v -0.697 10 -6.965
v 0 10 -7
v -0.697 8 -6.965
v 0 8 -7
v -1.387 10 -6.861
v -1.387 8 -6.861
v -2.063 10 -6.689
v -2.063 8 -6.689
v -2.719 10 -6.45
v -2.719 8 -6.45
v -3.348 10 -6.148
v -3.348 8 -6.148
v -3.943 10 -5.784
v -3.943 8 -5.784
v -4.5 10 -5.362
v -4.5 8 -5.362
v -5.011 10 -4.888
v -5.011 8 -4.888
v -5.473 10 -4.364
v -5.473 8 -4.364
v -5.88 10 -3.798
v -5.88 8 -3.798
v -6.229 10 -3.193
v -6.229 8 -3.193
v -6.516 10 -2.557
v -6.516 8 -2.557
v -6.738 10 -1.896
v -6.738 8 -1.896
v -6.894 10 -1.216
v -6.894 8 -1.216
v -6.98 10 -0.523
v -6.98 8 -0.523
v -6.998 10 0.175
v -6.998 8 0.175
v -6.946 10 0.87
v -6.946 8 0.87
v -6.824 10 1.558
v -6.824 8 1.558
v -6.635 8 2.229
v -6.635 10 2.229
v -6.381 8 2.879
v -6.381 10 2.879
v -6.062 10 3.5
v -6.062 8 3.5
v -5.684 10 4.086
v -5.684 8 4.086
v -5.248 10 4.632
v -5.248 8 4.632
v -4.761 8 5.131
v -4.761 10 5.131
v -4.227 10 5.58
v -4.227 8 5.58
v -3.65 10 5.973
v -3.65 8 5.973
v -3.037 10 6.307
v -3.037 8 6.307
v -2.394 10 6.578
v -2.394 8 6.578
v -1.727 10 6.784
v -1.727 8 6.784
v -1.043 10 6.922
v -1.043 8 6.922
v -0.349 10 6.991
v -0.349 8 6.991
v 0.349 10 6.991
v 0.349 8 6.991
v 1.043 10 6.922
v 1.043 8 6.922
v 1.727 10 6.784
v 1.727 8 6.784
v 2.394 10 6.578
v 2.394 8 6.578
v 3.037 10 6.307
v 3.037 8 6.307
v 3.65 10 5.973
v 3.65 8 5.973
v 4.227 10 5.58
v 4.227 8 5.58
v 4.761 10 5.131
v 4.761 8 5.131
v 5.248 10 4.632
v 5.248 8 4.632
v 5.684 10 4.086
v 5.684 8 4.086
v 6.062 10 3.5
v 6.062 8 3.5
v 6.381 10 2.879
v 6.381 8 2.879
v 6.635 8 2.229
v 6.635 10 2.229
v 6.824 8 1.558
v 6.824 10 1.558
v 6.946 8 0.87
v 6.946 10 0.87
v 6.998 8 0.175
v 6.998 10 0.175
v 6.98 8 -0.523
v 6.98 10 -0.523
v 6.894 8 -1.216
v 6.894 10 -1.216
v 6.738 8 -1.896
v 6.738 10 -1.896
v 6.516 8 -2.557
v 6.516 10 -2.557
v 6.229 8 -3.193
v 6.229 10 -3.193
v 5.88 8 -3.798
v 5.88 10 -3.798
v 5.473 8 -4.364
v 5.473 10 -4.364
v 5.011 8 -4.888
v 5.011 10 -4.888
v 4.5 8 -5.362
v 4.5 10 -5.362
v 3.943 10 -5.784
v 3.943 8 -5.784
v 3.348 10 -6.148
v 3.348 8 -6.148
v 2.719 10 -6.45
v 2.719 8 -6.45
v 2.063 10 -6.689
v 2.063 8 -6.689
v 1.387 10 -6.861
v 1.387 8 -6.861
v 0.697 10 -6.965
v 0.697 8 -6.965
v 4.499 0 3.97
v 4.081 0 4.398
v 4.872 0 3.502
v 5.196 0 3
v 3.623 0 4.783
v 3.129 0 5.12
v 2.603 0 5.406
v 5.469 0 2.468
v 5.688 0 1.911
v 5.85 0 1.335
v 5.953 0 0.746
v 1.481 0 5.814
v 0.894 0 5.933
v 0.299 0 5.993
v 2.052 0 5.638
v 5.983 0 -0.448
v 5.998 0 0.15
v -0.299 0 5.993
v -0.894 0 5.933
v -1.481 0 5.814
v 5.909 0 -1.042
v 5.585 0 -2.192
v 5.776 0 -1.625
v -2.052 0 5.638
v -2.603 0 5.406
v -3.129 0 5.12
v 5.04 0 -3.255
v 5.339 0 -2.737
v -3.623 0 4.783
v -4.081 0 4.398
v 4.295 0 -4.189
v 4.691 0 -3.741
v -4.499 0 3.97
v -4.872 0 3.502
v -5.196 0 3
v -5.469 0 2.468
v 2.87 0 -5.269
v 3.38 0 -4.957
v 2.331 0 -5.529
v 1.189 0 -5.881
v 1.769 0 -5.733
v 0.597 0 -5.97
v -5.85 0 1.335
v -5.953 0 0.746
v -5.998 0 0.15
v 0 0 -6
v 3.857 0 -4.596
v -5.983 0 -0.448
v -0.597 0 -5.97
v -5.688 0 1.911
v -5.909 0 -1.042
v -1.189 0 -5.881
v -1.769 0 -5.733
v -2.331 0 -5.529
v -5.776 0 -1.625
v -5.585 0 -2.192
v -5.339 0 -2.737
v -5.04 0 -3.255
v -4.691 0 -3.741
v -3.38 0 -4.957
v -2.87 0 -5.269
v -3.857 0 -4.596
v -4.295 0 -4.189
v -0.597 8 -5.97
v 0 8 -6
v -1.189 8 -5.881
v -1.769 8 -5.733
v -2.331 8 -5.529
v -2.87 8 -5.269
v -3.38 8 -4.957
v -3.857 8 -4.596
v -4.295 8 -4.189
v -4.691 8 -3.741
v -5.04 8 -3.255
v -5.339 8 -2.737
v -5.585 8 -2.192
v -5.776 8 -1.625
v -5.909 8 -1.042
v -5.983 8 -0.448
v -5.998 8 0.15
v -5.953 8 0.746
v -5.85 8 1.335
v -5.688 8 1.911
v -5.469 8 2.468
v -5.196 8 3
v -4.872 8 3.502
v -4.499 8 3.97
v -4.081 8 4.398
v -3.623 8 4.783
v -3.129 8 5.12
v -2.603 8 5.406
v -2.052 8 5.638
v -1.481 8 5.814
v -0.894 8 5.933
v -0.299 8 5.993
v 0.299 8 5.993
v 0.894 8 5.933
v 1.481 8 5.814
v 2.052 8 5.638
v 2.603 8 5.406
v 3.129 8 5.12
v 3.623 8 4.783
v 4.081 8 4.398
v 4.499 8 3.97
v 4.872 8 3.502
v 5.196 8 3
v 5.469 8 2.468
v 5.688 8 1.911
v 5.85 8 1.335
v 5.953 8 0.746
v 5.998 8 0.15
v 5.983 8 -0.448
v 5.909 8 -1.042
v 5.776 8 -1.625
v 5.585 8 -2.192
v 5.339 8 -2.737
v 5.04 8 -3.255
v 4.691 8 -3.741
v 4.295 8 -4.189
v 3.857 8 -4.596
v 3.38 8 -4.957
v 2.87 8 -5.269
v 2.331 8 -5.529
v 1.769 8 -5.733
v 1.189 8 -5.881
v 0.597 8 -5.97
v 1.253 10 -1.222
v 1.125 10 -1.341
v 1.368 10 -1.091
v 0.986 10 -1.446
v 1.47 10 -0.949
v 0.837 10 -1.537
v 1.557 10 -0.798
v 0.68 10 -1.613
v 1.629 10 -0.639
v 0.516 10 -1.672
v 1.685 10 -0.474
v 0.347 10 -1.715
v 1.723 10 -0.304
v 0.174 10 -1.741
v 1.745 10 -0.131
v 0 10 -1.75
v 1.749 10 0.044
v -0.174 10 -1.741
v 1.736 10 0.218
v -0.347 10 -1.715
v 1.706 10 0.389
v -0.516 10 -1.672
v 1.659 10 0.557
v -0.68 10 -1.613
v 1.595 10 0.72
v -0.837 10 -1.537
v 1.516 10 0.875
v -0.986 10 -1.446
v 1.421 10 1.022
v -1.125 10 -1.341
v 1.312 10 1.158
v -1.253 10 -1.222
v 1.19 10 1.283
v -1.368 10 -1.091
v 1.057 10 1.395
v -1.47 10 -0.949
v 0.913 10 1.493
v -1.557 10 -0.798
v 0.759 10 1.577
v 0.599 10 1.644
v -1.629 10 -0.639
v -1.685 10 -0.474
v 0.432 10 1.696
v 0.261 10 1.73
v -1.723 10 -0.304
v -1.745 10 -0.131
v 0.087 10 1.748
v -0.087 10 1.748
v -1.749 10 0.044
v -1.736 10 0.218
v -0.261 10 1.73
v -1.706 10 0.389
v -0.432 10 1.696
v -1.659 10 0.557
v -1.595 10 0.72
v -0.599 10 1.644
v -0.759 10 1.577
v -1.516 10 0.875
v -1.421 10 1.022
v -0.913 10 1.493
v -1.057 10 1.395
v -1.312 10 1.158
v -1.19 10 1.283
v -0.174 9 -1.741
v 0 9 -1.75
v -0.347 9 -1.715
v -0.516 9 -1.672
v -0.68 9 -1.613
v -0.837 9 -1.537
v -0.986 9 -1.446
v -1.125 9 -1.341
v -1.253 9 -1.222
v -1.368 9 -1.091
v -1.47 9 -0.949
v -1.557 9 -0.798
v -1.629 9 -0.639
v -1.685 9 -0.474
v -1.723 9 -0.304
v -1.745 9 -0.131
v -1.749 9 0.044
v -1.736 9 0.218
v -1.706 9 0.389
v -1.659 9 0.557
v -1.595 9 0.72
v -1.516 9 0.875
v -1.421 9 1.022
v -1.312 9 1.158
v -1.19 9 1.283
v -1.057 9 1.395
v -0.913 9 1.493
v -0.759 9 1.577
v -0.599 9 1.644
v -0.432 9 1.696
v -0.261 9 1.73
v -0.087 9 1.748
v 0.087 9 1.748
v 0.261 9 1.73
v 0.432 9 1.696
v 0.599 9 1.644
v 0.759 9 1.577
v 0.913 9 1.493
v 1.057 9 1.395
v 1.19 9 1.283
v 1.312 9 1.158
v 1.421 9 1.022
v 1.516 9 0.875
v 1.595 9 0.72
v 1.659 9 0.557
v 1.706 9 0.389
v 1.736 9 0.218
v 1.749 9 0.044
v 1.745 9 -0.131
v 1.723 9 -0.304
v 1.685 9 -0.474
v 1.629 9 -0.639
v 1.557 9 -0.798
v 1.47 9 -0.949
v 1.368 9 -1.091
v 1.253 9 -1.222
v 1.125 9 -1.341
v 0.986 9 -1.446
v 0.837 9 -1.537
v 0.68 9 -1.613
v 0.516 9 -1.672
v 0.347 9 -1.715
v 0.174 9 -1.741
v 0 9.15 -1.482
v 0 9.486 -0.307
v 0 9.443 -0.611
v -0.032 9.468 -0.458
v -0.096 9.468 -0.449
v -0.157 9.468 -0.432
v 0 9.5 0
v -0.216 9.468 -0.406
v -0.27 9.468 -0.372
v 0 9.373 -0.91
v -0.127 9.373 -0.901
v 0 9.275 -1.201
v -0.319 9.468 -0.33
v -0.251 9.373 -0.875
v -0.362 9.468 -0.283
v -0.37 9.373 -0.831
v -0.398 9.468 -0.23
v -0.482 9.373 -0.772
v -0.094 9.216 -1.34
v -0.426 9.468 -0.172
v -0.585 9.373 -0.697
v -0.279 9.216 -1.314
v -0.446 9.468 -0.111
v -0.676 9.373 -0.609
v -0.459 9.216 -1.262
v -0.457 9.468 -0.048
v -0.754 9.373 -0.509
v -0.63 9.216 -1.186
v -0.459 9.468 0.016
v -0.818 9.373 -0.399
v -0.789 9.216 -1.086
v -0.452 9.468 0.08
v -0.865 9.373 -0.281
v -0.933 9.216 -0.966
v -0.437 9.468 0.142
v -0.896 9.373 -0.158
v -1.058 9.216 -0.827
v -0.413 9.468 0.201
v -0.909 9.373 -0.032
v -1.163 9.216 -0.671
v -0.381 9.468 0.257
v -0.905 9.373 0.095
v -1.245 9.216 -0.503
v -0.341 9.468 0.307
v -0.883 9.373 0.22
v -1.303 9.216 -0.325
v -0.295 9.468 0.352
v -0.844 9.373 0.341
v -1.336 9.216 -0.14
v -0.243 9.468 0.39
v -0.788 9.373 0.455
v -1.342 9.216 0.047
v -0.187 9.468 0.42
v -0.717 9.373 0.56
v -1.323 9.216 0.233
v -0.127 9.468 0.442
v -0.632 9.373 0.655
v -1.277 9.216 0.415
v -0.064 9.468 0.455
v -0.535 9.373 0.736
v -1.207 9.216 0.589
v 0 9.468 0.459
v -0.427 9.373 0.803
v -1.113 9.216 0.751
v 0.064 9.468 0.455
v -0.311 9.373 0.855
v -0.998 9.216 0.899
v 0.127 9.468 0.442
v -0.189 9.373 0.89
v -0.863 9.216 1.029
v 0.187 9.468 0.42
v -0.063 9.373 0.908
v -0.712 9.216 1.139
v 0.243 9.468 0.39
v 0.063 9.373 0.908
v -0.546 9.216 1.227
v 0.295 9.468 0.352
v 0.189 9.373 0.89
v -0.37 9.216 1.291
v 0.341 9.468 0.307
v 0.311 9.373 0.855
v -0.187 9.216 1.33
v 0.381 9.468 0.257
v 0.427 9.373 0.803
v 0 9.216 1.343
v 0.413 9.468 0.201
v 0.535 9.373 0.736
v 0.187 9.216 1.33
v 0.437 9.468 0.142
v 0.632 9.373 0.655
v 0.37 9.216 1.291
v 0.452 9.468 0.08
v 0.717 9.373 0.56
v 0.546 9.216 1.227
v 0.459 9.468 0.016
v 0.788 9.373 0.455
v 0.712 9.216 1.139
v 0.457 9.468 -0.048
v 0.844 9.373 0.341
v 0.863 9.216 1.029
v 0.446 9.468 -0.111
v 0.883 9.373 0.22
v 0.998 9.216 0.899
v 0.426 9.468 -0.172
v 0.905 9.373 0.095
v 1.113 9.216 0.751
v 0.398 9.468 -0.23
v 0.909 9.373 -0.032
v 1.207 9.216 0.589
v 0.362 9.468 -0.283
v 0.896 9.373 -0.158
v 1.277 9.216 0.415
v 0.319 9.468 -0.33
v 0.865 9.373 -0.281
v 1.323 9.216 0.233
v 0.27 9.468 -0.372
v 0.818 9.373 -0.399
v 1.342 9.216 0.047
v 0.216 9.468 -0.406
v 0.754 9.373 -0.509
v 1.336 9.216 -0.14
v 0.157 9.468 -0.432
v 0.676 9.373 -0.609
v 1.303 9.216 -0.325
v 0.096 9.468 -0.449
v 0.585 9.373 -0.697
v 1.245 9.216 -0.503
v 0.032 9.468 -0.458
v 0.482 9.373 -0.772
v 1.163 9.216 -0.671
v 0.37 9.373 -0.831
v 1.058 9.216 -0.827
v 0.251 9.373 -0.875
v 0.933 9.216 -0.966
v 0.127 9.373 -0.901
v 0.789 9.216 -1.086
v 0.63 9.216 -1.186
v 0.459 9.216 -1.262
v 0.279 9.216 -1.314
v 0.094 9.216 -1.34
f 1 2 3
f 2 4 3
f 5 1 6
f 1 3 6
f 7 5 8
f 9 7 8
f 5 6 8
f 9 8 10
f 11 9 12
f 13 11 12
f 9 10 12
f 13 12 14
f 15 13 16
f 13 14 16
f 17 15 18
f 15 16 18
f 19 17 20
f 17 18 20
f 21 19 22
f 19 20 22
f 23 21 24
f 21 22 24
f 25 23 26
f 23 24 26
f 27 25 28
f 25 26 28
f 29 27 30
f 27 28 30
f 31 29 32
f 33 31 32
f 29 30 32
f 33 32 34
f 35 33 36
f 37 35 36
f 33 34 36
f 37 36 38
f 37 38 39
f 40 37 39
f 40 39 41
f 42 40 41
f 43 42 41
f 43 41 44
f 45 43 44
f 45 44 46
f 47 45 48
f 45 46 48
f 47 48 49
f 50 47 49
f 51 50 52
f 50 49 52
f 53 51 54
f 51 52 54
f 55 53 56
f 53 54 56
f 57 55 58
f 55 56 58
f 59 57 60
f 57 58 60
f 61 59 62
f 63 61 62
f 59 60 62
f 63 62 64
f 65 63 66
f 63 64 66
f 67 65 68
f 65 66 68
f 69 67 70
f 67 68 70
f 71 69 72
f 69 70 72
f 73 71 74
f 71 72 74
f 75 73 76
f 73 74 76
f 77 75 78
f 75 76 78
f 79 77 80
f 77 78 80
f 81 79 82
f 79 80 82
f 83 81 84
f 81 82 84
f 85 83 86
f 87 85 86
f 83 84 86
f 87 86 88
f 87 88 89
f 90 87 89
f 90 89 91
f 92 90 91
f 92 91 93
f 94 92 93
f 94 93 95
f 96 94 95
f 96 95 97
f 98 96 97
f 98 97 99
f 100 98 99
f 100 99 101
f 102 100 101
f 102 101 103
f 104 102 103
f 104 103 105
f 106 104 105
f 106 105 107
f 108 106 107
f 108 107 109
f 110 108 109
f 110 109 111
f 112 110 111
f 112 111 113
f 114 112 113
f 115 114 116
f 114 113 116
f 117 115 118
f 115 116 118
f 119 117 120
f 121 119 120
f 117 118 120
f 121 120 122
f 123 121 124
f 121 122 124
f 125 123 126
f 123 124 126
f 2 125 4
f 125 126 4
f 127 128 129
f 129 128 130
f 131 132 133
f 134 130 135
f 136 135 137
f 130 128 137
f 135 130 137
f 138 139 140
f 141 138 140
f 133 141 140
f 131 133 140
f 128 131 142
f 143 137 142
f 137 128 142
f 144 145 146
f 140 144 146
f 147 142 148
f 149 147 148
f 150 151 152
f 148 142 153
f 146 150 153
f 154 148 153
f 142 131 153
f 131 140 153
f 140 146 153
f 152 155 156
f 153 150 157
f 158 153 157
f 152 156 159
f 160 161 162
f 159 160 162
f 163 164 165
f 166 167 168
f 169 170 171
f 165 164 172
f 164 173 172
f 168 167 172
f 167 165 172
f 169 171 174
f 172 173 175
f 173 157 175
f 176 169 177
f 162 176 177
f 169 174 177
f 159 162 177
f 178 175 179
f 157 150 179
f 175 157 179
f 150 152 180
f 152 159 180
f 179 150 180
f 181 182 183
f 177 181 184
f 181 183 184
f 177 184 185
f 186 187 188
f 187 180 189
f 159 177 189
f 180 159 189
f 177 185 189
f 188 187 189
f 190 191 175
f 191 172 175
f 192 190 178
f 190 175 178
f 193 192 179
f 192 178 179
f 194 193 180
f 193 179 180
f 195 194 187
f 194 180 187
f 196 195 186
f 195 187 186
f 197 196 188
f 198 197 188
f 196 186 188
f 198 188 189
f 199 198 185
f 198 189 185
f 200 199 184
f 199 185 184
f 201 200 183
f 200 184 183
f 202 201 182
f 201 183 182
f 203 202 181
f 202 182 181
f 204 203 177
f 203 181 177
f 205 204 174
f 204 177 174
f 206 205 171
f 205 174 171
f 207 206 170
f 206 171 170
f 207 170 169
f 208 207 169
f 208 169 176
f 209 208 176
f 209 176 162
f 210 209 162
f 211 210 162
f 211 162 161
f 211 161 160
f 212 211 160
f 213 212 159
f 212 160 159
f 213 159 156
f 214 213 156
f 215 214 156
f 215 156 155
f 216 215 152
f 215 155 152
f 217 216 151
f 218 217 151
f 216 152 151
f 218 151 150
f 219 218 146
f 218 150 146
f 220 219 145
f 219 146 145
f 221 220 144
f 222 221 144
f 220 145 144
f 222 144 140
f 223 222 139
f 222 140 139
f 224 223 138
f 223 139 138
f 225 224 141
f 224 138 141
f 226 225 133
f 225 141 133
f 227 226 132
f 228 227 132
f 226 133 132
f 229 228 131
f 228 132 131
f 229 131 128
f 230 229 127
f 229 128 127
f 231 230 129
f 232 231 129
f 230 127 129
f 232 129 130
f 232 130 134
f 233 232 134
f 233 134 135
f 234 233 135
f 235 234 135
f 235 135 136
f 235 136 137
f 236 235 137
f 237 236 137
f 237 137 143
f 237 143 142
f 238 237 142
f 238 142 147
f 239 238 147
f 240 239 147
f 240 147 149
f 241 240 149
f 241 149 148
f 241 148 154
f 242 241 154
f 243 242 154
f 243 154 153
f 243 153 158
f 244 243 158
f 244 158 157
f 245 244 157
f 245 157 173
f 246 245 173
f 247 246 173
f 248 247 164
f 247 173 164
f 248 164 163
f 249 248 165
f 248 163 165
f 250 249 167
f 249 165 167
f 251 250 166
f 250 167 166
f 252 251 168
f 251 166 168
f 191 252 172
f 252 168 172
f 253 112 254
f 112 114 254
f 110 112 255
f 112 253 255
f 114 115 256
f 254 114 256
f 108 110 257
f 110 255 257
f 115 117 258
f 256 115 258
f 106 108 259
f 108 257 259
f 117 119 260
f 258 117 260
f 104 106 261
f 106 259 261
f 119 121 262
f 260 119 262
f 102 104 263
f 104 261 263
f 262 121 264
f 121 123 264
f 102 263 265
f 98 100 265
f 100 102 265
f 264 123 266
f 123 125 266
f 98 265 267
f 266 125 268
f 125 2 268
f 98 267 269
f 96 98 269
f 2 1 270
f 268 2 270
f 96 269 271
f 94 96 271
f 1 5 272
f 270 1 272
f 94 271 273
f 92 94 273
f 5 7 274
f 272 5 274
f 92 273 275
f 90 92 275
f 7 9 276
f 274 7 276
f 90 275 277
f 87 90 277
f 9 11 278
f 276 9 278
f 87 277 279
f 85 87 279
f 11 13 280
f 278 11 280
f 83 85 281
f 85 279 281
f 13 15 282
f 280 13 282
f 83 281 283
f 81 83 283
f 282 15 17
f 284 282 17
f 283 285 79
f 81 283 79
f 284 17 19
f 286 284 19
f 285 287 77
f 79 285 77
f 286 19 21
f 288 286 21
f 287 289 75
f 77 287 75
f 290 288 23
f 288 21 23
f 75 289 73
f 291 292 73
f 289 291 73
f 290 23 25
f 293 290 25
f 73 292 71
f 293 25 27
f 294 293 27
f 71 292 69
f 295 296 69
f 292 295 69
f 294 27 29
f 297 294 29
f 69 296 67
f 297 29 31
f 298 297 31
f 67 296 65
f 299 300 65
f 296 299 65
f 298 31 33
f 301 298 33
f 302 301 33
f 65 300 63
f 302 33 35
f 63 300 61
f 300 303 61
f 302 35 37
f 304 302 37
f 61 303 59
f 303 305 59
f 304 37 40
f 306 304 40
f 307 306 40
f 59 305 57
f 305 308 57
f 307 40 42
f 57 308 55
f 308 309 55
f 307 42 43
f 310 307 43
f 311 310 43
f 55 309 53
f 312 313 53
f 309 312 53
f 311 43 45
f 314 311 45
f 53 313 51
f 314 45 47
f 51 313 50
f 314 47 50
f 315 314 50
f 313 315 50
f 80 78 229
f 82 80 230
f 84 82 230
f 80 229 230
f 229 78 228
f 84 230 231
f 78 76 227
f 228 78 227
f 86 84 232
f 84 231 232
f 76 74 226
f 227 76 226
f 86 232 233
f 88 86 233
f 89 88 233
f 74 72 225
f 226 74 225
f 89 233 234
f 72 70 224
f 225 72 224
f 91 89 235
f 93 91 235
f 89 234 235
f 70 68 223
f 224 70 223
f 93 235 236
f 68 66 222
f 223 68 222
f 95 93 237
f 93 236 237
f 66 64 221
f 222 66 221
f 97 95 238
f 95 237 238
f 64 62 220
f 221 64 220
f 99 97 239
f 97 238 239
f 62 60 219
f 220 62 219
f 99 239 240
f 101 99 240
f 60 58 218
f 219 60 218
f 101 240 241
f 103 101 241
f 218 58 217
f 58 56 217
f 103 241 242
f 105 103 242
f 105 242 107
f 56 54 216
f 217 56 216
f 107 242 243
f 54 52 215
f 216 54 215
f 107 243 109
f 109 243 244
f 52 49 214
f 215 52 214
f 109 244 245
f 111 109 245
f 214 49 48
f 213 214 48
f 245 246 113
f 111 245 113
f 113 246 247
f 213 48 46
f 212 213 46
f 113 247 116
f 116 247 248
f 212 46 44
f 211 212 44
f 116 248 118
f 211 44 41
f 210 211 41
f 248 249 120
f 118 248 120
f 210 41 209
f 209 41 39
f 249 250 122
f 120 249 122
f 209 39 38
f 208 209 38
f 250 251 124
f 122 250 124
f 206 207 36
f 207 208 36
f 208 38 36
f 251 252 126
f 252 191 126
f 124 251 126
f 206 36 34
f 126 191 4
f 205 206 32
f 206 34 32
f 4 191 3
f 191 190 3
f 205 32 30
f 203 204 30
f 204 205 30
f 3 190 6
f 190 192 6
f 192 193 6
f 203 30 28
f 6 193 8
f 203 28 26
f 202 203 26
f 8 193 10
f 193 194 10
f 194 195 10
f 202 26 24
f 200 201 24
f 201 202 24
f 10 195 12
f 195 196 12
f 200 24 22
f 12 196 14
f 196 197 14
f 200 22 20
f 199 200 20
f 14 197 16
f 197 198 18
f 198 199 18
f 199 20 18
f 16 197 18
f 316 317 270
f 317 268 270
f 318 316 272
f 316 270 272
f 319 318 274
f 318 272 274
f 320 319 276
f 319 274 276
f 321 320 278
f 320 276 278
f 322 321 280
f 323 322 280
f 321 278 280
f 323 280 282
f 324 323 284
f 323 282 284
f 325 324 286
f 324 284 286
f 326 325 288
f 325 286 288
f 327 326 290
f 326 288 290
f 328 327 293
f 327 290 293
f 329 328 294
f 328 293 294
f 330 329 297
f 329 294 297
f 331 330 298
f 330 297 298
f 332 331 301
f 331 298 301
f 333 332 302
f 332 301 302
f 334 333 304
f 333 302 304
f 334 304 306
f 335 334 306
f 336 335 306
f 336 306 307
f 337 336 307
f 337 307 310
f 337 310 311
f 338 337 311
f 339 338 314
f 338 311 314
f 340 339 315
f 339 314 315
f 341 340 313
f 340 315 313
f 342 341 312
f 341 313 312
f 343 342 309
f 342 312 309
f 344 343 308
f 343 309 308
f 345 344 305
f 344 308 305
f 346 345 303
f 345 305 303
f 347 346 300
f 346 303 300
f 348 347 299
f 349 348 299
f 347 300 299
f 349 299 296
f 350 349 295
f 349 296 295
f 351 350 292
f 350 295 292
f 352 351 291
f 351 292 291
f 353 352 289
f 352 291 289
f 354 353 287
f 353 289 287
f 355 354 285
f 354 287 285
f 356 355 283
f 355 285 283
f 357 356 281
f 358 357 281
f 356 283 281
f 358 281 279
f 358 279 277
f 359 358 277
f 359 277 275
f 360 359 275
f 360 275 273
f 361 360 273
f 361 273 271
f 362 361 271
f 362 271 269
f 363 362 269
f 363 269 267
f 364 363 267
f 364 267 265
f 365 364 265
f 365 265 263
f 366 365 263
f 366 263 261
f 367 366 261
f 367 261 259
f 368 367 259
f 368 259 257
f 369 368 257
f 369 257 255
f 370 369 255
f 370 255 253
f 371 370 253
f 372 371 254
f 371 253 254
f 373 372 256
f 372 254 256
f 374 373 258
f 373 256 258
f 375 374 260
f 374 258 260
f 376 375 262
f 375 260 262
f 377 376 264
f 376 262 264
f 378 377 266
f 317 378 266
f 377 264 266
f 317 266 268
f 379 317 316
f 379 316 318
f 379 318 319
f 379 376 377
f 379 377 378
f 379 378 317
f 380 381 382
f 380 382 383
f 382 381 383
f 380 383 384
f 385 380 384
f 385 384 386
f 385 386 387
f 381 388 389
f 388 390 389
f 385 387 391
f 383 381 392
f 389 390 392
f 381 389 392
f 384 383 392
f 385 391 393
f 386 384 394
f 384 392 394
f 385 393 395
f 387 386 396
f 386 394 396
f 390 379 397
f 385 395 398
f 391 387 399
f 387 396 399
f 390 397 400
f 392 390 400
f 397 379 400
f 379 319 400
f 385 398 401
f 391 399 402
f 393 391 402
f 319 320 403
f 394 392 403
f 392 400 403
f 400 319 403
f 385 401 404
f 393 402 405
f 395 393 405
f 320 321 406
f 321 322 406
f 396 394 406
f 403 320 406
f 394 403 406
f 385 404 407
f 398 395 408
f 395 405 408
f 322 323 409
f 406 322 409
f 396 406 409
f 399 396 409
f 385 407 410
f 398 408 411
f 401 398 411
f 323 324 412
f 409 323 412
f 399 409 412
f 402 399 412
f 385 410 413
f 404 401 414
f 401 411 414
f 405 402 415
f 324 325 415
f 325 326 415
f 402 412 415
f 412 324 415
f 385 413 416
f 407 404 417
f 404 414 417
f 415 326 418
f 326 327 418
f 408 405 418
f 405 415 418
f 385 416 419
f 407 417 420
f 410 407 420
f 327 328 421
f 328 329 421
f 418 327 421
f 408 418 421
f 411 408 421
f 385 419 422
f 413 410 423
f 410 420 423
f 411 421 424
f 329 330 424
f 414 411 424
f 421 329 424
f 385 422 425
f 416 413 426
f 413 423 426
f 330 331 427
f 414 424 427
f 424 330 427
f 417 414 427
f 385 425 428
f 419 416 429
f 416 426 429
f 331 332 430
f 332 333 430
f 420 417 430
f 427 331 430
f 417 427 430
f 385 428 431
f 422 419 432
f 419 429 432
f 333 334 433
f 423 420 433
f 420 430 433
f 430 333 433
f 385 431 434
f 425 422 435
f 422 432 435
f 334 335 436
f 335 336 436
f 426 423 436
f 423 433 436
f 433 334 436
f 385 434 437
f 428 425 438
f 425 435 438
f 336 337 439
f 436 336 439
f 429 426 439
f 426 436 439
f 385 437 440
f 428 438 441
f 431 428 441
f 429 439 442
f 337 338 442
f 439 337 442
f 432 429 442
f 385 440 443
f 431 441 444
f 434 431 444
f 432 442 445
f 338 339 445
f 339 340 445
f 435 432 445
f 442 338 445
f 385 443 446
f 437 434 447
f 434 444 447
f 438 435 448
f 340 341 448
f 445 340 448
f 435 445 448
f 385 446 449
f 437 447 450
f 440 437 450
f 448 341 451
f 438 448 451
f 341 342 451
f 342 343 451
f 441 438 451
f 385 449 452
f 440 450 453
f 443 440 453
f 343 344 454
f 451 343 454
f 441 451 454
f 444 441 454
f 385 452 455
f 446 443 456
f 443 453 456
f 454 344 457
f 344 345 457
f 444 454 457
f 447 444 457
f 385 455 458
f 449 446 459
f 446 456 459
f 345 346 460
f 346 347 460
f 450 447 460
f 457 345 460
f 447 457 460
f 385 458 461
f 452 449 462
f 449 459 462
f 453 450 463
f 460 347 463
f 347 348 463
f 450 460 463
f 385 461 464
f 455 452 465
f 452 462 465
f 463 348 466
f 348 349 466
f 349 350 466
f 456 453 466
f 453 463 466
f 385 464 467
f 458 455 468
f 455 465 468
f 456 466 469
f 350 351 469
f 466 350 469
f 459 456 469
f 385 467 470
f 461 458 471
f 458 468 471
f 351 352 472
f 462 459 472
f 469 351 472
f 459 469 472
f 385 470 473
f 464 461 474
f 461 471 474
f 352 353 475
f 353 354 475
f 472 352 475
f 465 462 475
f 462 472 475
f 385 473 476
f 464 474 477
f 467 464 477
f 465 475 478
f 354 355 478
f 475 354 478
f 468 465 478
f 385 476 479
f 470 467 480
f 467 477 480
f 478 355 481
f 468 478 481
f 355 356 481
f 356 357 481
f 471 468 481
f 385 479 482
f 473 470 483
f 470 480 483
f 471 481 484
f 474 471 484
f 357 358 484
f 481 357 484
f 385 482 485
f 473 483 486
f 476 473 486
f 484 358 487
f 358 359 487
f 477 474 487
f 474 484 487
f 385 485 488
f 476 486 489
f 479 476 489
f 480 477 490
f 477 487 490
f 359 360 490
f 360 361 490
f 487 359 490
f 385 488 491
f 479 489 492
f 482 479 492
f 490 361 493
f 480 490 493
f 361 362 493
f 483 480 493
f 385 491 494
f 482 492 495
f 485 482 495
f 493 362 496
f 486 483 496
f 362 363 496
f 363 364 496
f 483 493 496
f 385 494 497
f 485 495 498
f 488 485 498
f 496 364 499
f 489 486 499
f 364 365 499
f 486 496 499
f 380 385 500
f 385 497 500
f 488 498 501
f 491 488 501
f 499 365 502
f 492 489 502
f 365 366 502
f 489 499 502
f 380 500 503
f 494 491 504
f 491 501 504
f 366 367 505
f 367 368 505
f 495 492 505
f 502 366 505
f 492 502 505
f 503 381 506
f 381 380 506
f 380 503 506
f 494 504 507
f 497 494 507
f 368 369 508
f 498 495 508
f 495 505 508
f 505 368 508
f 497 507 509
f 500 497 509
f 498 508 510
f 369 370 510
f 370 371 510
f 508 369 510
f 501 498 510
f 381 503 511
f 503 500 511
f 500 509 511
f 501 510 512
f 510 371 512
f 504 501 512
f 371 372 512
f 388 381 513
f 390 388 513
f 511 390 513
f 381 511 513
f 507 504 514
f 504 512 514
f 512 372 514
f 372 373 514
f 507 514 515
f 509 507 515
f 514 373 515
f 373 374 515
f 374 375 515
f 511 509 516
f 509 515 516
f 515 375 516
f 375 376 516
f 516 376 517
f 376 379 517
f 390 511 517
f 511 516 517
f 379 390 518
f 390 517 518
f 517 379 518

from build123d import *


with BuildPart() as part:
    # Sketch1 → Revolve1 (revolve)
    with BuildSketch(Plane(origin=(0, 0, 0), x_dir=(0, 0, -1), z_dir=(1, 0, 0))):
        with BuildLine():
            Line((1.75, 9), (1.75, 10))
            Line((1.75, 10), (7, 10))
            Line((7, 10), (7, 8))
            Line((7, 8), (6, 8))
            Line((6, 8), (6, 0))
            Line((6, 0), (0, 0))
            Line((0, 0), (0, 9.5))
            ThreePointArc((0, 9.5), (0.910013736, 9.372548077), (1.75, 9))
        make_face()
    revolve(axis=Axis((0, 0, 0), (0, 1, 0)))


solid = part.part
